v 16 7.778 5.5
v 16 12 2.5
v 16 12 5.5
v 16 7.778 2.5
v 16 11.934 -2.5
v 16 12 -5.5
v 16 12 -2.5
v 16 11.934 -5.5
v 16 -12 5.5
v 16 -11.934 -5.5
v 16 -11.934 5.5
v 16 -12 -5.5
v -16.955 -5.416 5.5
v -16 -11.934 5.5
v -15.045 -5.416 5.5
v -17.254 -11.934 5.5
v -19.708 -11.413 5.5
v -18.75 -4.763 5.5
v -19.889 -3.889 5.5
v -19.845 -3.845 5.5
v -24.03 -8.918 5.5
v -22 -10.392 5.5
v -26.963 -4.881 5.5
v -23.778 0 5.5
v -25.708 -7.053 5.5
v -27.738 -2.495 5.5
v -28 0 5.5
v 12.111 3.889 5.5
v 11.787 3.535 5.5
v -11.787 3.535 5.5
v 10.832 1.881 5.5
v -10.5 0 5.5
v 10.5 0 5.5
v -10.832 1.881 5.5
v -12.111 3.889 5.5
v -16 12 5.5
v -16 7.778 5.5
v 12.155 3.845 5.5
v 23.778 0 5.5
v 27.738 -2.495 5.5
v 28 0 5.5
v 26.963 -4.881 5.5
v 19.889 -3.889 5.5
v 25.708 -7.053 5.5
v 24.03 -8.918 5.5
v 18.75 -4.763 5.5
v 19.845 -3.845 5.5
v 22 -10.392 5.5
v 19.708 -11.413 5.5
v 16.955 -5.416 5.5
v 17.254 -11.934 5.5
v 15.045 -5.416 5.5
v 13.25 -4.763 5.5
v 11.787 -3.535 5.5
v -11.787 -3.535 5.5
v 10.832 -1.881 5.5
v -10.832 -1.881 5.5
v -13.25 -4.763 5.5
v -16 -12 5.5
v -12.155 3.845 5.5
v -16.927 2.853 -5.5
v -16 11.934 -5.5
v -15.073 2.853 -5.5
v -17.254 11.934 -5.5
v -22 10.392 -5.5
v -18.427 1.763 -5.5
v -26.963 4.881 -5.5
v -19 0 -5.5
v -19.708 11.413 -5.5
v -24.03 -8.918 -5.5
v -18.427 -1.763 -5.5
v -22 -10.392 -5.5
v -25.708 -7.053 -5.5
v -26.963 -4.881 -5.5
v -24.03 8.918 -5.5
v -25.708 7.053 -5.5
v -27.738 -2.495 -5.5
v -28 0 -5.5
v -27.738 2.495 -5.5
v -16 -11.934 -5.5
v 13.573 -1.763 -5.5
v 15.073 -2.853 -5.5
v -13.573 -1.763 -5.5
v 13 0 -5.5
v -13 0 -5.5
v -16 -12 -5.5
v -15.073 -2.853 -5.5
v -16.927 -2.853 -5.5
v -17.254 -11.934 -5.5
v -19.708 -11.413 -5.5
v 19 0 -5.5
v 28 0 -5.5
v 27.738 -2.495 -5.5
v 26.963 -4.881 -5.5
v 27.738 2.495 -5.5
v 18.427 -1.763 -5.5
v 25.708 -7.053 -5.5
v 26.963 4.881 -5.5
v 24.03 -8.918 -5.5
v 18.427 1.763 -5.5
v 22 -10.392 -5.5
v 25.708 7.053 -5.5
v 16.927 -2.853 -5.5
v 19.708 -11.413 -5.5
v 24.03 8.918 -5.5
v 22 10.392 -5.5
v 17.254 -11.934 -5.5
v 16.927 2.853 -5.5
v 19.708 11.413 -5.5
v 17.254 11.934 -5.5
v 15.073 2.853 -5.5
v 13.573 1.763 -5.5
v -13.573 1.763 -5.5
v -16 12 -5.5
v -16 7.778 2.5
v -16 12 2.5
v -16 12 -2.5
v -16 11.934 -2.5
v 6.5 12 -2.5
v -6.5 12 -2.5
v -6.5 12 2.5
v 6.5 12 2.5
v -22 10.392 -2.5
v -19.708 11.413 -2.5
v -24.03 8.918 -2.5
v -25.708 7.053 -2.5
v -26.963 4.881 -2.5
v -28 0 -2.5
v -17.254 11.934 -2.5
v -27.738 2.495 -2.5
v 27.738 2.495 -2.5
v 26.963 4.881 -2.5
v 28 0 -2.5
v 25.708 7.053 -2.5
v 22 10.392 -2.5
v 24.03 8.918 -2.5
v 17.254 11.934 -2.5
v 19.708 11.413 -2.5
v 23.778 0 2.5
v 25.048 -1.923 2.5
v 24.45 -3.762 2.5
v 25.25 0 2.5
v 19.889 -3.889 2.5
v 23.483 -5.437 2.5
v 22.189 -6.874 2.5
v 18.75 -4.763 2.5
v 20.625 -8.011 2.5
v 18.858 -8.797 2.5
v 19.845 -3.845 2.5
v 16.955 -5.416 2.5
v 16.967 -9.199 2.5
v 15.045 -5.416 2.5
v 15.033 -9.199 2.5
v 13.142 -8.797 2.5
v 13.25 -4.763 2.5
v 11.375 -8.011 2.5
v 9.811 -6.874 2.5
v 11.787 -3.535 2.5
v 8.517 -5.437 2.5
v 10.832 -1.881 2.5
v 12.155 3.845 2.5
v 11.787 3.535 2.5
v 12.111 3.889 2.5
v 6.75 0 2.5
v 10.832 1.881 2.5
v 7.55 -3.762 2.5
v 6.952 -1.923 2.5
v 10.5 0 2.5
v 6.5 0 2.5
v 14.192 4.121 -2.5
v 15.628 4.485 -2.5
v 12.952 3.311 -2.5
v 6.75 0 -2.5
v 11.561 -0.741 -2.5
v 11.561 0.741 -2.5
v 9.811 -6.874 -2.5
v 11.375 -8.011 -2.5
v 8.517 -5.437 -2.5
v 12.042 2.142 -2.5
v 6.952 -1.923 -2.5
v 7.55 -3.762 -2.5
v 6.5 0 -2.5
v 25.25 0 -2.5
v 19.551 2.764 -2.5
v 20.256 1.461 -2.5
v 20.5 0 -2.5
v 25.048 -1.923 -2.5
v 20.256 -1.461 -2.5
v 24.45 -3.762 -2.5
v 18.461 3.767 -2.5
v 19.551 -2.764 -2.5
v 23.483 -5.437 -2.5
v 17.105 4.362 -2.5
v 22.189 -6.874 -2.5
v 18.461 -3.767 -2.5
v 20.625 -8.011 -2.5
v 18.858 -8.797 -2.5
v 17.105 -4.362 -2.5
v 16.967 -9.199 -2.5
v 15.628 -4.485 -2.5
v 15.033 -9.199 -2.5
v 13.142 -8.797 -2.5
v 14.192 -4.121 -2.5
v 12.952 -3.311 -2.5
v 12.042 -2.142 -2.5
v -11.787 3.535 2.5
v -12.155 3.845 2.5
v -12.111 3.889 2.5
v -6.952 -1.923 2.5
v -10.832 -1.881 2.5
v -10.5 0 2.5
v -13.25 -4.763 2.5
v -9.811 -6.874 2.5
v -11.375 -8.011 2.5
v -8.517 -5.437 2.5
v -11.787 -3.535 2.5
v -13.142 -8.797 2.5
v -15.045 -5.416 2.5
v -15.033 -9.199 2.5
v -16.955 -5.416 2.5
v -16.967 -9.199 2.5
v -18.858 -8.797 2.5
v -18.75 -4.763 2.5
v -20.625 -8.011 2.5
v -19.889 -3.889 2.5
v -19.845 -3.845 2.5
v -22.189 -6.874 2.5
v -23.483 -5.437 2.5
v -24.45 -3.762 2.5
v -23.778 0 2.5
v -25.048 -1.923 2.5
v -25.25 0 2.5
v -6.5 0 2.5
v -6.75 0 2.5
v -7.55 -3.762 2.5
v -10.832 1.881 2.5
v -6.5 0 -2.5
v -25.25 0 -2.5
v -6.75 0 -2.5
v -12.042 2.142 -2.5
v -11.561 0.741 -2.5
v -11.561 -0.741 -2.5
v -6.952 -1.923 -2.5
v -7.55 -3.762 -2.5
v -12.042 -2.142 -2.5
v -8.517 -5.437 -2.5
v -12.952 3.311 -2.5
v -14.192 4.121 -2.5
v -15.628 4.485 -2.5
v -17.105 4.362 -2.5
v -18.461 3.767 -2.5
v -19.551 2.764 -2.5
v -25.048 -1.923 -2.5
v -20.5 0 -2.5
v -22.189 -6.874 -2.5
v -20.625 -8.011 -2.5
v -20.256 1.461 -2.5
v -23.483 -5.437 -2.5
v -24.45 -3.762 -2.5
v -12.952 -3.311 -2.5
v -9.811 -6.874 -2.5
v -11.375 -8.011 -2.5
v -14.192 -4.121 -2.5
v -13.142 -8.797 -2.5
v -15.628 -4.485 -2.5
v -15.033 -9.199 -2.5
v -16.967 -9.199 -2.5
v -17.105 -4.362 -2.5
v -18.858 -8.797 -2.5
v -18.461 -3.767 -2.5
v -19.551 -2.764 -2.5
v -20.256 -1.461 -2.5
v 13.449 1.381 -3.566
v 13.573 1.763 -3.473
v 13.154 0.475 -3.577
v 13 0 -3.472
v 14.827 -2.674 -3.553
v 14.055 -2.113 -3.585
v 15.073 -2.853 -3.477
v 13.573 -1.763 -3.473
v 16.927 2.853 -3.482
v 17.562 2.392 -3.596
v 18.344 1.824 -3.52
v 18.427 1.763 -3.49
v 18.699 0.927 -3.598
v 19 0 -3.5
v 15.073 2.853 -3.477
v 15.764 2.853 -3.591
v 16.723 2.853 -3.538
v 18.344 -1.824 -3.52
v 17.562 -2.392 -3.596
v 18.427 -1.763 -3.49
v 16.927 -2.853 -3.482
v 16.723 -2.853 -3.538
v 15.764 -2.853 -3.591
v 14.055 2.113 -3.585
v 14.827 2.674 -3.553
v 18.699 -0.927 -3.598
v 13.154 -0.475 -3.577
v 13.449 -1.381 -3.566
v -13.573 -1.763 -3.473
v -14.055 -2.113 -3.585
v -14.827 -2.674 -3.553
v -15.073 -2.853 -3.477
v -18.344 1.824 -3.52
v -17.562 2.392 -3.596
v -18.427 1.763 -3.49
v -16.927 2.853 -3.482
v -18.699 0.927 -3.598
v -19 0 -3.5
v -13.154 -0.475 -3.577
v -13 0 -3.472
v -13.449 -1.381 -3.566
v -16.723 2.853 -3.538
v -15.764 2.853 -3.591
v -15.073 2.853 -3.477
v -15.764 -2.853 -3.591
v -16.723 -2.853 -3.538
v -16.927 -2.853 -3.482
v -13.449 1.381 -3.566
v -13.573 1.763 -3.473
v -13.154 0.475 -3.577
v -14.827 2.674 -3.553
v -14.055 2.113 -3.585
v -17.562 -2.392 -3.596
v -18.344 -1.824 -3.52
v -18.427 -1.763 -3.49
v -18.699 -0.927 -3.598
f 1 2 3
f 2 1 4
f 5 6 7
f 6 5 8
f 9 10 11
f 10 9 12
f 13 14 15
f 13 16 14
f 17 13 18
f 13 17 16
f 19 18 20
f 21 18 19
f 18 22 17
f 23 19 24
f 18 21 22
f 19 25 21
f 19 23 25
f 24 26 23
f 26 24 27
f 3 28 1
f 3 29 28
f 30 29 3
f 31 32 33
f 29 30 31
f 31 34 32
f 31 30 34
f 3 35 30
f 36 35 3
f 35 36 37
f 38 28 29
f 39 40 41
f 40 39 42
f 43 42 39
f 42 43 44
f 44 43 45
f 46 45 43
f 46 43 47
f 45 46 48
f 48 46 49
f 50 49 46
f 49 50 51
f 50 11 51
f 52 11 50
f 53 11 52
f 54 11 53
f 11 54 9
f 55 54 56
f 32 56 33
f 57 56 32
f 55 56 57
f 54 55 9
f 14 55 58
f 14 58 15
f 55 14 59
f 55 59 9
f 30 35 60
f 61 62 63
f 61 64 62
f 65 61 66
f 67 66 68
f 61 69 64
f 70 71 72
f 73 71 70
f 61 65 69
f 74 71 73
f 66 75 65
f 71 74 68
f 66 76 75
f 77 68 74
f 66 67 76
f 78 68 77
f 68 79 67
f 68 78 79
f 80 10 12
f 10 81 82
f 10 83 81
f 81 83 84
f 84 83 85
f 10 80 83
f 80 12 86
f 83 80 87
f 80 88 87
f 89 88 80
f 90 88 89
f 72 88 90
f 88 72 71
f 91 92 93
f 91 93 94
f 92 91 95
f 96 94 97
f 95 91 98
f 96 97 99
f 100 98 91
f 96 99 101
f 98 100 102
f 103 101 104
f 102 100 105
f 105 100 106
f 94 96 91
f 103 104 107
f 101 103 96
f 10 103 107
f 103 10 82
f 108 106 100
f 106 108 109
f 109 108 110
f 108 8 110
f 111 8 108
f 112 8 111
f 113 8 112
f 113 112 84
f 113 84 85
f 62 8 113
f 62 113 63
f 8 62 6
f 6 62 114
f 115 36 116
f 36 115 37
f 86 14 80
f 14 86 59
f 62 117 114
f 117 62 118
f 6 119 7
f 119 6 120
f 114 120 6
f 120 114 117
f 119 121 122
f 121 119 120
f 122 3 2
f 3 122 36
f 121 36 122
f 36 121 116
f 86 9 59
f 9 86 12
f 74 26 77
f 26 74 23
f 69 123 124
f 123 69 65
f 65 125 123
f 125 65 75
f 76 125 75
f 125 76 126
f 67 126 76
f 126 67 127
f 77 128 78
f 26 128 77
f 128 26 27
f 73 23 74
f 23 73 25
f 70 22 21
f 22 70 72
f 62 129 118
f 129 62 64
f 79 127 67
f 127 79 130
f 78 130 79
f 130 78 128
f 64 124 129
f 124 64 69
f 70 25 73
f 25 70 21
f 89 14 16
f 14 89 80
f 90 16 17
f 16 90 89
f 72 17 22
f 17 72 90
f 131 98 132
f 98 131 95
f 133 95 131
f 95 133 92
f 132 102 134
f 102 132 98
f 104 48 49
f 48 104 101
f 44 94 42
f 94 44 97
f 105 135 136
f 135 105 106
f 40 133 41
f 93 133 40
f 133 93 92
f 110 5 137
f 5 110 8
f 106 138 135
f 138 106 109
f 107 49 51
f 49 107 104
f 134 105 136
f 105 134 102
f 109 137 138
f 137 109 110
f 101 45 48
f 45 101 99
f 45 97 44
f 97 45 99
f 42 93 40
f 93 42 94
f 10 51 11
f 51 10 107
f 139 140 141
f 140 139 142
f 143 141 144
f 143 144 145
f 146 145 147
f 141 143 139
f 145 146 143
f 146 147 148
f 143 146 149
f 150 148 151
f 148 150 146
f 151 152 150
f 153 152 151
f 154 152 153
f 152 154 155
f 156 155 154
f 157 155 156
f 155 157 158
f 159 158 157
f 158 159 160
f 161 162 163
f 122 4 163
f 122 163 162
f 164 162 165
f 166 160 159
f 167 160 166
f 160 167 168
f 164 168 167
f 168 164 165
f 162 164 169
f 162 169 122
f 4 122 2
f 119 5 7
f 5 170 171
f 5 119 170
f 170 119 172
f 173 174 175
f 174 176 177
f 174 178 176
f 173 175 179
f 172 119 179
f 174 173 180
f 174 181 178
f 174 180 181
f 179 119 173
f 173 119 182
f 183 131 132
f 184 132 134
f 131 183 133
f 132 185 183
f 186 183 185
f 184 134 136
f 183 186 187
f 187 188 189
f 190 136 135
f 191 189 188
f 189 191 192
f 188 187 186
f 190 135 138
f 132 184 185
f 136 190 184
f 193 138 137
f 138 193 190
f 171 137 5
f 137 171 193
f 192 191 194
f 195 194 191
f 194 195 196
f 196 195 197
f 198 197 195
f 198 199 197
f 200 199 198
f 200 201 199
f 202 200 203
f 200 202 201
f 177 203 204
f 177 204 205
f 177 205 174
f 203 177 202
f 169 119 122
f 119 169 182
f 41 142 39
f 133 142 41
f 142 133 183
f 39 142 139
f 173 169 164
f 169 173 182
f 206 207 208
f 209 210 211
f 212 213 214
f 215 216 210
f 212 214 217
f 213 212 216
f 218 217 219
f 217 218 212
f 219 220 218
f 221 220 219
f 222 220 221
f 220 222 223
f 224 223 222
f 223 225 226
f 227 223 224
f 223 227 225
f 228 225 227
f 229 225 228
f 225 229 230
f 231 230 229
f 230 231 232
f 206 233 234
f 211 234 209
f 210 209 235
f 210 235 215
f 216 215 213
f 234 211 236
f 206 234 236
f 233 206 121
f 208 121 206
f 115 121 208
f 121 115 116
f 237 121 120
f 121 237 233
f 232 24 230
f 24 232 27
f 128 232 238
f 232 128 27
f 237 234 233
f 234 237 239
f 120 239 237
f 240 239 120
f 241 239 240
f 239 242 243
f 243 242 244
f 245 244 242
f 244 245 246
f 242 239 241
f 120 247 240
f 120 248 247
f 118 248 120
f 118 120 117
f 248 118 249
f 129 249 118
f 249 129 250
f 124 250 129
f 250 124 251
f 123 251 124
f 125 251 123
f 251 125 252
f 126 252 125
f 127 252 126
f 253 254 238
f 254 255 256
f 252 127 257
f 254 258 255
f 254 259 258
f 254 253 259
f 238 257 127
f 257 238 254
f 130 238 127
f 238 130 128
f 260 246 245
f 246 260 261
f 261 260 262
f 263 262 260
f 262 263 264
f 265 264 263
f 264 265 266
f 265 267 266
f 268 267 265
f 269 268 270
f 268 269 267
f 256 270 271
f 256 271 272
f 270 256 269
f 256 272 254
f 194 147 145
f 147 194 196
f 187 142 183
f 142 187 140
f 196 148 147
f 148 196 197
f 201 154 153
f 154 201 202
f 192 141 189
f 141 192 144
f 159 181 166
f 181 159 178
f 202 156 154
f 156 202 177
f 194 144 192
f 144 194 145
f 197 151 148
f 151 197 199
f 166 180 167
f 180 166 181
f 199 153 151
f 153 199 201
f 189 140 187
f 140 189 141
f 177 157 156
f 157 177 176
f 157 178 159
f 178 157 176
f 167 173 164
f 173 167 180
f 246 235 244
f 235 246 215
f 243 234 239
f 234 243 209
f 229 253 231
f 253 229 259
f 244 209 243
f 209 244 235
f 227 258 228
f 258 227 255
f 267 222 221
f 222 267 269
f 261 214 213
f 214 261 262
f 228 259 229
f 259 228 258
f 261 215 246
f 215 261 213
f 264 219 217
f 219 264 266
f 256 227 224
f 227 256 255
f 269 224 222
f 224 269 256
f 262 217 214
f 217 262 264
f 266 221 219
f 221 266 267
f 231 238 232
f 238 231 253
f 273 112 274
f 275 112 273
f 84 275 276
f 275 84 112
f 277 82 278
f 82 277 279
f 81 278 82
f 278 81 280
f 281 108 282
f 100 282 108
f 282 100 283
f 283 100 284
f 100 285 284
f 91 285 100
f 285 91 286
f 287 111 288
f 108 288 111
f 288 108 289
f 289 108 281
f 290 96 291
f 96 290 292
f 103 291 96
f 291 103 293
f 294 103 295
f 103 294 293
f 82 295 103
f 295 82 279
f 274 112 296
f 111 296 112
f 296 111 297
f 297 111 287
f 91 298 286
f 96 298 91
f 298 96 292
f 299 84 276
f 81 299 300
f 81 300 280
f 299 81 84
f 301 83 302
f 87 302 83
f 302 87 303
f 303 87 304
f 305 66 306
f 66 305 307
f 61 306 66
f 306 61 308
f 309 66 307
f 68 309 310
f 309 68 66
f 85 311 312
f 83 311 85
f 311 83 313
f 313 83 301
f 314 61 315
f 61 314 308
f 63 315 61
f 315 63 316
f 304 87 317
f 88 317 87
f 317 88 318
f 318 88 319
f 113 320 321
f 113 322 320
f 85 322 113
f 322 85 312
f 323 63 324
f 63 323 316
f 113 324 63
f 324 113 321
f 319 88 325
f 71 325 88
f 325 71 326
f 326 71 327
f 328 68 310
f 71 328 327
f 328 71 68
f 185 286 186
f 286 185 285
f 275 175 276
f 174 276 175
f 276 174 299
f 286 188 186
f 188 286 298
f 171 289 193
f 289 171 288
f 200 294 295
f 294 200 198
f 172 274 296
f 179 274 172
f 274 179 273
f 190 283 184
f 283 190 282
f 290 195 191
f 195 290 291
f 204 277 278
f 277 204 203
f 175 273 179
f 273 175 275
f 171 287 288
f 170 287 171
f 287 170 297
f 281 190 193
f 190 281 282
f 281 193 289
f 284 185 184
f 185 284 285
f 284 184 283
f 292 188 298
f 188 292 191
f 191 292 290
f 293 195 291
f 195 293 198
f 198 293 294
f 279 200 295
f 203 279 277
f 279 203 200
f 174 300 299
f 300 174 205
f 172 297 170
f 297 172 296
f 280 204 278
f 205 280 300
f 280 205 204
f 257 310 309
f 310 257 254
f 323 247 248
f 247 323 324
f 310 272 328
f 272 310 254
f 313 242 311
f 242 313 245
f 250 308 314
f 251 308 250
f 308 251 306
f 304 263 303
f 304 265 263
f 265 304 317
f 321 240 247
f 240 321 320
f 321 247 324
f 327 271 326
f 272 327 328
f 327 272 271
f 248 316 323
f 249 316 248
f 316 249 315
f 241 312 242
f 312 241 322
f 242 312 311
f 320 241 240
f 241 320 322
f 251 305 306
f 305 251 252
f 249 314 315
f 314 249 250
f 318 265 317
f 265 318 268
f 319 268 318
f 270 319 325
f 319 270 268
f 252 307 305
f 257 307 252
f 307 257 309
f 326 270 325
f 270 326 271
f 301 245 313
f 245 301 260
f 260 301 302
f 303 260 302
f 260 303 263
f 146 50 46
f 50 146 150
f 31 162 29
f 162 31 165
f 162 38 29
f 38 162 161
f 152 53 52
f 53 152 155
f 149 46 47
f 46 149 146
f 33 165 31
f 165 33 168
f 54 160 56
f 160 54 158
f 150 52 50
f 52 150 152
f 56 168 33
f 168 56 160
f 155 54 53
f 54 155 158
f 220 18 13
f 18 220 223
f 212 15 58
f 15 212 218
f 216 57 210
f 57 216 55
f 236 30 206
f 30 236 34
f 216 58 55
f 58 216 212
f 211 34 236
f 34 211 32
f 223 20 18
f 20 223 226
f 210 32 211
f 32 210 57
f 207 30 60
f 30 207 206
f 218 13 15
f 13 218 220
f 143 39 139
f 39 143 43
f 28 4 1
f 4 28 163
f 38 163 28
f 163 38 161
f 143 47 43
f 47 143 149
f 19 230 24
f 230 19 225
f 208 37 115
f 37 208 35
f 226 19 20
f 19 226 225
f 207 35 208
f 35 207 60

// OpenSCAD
// larghezza totale 56
// diametro 24
// spessore 11
l = 56;
dia = 24;
sp = 11;

difference(){

union(){    
    cube([l-dia,dia,sp],true);
    translate([-(l-dia)/2,0,0])cylinder(sp,dia/2,dia/2,true);
    translate([(l-dia)/2,0,0])cylinder(sp,dia/2,dia/2,true);
       }

// fessura centrale
union(){
    // rettangolo superiore
    translate([l/2-(l-13)/2,0,-sp/2+3])cube([(l-13)/2,dia/2,sp-3-3]);
    mirror([1,0,0])translate([l/2-(l-13)/2,0,-sp/2+3])cube([(l-13)/2,dia/2,sp-3-3]);
    // cilindri alloggio
    translate([(l-dia)/2,0,0])cylinder(sp-3-3,(dia-5.5)/2,(dia-5.5)/2,true);
    mirror([1,0,0])translate([(l-dia)/2,0,0])cylinder(sp-3-3,(dia-5.5)/2,(dia-5.5)/2,true);     
       }

//fori per viti legno
union(){
    // foro vite
    translate([(l-dia)/2,0,-sp/2])cylinder(4,3,3,false);
    mirror([1,0,0])translate([(l-dia)/2,0,-sp/2])cylinder(4,3,3,false);   
    // svaso
    translate([(l-dia)/2,0,-sp/2])cylinder(4,0,6,false);  
    mirror([1,0,0])translate([(l-dia)/2,0,-sp/2])cylinder(4,0,6,false);    
    }

// fori faccia superiore    
union(){
    // quadrato d'angolo
    translate([(l-dia)/2,0,0])cube(dia/2);
    mirror([1,0,0])translate([(l-dia)/2,0,0])cube(dia/2);
    // cilindro
    translate([(l-dia)/2,0,0])cylinder(sp/2,11/2,11/2);
    mirror([1,0,0])translate([(l-dia)/2,0,0])cylinder(sp/2,11/2,11/2);
    // cubo inclinato per raccordo
    translate([(l-dia)/2,0,sp/2])rotate([0,0,-45])translate([0,11/2,0])cube(11,true);
    mirror([1,0,0])translate([(l-dia)/2,0,sp/2])rotate([0,0,-45])translate([0,11/2,0])cube(11,true);   
    }
 }
